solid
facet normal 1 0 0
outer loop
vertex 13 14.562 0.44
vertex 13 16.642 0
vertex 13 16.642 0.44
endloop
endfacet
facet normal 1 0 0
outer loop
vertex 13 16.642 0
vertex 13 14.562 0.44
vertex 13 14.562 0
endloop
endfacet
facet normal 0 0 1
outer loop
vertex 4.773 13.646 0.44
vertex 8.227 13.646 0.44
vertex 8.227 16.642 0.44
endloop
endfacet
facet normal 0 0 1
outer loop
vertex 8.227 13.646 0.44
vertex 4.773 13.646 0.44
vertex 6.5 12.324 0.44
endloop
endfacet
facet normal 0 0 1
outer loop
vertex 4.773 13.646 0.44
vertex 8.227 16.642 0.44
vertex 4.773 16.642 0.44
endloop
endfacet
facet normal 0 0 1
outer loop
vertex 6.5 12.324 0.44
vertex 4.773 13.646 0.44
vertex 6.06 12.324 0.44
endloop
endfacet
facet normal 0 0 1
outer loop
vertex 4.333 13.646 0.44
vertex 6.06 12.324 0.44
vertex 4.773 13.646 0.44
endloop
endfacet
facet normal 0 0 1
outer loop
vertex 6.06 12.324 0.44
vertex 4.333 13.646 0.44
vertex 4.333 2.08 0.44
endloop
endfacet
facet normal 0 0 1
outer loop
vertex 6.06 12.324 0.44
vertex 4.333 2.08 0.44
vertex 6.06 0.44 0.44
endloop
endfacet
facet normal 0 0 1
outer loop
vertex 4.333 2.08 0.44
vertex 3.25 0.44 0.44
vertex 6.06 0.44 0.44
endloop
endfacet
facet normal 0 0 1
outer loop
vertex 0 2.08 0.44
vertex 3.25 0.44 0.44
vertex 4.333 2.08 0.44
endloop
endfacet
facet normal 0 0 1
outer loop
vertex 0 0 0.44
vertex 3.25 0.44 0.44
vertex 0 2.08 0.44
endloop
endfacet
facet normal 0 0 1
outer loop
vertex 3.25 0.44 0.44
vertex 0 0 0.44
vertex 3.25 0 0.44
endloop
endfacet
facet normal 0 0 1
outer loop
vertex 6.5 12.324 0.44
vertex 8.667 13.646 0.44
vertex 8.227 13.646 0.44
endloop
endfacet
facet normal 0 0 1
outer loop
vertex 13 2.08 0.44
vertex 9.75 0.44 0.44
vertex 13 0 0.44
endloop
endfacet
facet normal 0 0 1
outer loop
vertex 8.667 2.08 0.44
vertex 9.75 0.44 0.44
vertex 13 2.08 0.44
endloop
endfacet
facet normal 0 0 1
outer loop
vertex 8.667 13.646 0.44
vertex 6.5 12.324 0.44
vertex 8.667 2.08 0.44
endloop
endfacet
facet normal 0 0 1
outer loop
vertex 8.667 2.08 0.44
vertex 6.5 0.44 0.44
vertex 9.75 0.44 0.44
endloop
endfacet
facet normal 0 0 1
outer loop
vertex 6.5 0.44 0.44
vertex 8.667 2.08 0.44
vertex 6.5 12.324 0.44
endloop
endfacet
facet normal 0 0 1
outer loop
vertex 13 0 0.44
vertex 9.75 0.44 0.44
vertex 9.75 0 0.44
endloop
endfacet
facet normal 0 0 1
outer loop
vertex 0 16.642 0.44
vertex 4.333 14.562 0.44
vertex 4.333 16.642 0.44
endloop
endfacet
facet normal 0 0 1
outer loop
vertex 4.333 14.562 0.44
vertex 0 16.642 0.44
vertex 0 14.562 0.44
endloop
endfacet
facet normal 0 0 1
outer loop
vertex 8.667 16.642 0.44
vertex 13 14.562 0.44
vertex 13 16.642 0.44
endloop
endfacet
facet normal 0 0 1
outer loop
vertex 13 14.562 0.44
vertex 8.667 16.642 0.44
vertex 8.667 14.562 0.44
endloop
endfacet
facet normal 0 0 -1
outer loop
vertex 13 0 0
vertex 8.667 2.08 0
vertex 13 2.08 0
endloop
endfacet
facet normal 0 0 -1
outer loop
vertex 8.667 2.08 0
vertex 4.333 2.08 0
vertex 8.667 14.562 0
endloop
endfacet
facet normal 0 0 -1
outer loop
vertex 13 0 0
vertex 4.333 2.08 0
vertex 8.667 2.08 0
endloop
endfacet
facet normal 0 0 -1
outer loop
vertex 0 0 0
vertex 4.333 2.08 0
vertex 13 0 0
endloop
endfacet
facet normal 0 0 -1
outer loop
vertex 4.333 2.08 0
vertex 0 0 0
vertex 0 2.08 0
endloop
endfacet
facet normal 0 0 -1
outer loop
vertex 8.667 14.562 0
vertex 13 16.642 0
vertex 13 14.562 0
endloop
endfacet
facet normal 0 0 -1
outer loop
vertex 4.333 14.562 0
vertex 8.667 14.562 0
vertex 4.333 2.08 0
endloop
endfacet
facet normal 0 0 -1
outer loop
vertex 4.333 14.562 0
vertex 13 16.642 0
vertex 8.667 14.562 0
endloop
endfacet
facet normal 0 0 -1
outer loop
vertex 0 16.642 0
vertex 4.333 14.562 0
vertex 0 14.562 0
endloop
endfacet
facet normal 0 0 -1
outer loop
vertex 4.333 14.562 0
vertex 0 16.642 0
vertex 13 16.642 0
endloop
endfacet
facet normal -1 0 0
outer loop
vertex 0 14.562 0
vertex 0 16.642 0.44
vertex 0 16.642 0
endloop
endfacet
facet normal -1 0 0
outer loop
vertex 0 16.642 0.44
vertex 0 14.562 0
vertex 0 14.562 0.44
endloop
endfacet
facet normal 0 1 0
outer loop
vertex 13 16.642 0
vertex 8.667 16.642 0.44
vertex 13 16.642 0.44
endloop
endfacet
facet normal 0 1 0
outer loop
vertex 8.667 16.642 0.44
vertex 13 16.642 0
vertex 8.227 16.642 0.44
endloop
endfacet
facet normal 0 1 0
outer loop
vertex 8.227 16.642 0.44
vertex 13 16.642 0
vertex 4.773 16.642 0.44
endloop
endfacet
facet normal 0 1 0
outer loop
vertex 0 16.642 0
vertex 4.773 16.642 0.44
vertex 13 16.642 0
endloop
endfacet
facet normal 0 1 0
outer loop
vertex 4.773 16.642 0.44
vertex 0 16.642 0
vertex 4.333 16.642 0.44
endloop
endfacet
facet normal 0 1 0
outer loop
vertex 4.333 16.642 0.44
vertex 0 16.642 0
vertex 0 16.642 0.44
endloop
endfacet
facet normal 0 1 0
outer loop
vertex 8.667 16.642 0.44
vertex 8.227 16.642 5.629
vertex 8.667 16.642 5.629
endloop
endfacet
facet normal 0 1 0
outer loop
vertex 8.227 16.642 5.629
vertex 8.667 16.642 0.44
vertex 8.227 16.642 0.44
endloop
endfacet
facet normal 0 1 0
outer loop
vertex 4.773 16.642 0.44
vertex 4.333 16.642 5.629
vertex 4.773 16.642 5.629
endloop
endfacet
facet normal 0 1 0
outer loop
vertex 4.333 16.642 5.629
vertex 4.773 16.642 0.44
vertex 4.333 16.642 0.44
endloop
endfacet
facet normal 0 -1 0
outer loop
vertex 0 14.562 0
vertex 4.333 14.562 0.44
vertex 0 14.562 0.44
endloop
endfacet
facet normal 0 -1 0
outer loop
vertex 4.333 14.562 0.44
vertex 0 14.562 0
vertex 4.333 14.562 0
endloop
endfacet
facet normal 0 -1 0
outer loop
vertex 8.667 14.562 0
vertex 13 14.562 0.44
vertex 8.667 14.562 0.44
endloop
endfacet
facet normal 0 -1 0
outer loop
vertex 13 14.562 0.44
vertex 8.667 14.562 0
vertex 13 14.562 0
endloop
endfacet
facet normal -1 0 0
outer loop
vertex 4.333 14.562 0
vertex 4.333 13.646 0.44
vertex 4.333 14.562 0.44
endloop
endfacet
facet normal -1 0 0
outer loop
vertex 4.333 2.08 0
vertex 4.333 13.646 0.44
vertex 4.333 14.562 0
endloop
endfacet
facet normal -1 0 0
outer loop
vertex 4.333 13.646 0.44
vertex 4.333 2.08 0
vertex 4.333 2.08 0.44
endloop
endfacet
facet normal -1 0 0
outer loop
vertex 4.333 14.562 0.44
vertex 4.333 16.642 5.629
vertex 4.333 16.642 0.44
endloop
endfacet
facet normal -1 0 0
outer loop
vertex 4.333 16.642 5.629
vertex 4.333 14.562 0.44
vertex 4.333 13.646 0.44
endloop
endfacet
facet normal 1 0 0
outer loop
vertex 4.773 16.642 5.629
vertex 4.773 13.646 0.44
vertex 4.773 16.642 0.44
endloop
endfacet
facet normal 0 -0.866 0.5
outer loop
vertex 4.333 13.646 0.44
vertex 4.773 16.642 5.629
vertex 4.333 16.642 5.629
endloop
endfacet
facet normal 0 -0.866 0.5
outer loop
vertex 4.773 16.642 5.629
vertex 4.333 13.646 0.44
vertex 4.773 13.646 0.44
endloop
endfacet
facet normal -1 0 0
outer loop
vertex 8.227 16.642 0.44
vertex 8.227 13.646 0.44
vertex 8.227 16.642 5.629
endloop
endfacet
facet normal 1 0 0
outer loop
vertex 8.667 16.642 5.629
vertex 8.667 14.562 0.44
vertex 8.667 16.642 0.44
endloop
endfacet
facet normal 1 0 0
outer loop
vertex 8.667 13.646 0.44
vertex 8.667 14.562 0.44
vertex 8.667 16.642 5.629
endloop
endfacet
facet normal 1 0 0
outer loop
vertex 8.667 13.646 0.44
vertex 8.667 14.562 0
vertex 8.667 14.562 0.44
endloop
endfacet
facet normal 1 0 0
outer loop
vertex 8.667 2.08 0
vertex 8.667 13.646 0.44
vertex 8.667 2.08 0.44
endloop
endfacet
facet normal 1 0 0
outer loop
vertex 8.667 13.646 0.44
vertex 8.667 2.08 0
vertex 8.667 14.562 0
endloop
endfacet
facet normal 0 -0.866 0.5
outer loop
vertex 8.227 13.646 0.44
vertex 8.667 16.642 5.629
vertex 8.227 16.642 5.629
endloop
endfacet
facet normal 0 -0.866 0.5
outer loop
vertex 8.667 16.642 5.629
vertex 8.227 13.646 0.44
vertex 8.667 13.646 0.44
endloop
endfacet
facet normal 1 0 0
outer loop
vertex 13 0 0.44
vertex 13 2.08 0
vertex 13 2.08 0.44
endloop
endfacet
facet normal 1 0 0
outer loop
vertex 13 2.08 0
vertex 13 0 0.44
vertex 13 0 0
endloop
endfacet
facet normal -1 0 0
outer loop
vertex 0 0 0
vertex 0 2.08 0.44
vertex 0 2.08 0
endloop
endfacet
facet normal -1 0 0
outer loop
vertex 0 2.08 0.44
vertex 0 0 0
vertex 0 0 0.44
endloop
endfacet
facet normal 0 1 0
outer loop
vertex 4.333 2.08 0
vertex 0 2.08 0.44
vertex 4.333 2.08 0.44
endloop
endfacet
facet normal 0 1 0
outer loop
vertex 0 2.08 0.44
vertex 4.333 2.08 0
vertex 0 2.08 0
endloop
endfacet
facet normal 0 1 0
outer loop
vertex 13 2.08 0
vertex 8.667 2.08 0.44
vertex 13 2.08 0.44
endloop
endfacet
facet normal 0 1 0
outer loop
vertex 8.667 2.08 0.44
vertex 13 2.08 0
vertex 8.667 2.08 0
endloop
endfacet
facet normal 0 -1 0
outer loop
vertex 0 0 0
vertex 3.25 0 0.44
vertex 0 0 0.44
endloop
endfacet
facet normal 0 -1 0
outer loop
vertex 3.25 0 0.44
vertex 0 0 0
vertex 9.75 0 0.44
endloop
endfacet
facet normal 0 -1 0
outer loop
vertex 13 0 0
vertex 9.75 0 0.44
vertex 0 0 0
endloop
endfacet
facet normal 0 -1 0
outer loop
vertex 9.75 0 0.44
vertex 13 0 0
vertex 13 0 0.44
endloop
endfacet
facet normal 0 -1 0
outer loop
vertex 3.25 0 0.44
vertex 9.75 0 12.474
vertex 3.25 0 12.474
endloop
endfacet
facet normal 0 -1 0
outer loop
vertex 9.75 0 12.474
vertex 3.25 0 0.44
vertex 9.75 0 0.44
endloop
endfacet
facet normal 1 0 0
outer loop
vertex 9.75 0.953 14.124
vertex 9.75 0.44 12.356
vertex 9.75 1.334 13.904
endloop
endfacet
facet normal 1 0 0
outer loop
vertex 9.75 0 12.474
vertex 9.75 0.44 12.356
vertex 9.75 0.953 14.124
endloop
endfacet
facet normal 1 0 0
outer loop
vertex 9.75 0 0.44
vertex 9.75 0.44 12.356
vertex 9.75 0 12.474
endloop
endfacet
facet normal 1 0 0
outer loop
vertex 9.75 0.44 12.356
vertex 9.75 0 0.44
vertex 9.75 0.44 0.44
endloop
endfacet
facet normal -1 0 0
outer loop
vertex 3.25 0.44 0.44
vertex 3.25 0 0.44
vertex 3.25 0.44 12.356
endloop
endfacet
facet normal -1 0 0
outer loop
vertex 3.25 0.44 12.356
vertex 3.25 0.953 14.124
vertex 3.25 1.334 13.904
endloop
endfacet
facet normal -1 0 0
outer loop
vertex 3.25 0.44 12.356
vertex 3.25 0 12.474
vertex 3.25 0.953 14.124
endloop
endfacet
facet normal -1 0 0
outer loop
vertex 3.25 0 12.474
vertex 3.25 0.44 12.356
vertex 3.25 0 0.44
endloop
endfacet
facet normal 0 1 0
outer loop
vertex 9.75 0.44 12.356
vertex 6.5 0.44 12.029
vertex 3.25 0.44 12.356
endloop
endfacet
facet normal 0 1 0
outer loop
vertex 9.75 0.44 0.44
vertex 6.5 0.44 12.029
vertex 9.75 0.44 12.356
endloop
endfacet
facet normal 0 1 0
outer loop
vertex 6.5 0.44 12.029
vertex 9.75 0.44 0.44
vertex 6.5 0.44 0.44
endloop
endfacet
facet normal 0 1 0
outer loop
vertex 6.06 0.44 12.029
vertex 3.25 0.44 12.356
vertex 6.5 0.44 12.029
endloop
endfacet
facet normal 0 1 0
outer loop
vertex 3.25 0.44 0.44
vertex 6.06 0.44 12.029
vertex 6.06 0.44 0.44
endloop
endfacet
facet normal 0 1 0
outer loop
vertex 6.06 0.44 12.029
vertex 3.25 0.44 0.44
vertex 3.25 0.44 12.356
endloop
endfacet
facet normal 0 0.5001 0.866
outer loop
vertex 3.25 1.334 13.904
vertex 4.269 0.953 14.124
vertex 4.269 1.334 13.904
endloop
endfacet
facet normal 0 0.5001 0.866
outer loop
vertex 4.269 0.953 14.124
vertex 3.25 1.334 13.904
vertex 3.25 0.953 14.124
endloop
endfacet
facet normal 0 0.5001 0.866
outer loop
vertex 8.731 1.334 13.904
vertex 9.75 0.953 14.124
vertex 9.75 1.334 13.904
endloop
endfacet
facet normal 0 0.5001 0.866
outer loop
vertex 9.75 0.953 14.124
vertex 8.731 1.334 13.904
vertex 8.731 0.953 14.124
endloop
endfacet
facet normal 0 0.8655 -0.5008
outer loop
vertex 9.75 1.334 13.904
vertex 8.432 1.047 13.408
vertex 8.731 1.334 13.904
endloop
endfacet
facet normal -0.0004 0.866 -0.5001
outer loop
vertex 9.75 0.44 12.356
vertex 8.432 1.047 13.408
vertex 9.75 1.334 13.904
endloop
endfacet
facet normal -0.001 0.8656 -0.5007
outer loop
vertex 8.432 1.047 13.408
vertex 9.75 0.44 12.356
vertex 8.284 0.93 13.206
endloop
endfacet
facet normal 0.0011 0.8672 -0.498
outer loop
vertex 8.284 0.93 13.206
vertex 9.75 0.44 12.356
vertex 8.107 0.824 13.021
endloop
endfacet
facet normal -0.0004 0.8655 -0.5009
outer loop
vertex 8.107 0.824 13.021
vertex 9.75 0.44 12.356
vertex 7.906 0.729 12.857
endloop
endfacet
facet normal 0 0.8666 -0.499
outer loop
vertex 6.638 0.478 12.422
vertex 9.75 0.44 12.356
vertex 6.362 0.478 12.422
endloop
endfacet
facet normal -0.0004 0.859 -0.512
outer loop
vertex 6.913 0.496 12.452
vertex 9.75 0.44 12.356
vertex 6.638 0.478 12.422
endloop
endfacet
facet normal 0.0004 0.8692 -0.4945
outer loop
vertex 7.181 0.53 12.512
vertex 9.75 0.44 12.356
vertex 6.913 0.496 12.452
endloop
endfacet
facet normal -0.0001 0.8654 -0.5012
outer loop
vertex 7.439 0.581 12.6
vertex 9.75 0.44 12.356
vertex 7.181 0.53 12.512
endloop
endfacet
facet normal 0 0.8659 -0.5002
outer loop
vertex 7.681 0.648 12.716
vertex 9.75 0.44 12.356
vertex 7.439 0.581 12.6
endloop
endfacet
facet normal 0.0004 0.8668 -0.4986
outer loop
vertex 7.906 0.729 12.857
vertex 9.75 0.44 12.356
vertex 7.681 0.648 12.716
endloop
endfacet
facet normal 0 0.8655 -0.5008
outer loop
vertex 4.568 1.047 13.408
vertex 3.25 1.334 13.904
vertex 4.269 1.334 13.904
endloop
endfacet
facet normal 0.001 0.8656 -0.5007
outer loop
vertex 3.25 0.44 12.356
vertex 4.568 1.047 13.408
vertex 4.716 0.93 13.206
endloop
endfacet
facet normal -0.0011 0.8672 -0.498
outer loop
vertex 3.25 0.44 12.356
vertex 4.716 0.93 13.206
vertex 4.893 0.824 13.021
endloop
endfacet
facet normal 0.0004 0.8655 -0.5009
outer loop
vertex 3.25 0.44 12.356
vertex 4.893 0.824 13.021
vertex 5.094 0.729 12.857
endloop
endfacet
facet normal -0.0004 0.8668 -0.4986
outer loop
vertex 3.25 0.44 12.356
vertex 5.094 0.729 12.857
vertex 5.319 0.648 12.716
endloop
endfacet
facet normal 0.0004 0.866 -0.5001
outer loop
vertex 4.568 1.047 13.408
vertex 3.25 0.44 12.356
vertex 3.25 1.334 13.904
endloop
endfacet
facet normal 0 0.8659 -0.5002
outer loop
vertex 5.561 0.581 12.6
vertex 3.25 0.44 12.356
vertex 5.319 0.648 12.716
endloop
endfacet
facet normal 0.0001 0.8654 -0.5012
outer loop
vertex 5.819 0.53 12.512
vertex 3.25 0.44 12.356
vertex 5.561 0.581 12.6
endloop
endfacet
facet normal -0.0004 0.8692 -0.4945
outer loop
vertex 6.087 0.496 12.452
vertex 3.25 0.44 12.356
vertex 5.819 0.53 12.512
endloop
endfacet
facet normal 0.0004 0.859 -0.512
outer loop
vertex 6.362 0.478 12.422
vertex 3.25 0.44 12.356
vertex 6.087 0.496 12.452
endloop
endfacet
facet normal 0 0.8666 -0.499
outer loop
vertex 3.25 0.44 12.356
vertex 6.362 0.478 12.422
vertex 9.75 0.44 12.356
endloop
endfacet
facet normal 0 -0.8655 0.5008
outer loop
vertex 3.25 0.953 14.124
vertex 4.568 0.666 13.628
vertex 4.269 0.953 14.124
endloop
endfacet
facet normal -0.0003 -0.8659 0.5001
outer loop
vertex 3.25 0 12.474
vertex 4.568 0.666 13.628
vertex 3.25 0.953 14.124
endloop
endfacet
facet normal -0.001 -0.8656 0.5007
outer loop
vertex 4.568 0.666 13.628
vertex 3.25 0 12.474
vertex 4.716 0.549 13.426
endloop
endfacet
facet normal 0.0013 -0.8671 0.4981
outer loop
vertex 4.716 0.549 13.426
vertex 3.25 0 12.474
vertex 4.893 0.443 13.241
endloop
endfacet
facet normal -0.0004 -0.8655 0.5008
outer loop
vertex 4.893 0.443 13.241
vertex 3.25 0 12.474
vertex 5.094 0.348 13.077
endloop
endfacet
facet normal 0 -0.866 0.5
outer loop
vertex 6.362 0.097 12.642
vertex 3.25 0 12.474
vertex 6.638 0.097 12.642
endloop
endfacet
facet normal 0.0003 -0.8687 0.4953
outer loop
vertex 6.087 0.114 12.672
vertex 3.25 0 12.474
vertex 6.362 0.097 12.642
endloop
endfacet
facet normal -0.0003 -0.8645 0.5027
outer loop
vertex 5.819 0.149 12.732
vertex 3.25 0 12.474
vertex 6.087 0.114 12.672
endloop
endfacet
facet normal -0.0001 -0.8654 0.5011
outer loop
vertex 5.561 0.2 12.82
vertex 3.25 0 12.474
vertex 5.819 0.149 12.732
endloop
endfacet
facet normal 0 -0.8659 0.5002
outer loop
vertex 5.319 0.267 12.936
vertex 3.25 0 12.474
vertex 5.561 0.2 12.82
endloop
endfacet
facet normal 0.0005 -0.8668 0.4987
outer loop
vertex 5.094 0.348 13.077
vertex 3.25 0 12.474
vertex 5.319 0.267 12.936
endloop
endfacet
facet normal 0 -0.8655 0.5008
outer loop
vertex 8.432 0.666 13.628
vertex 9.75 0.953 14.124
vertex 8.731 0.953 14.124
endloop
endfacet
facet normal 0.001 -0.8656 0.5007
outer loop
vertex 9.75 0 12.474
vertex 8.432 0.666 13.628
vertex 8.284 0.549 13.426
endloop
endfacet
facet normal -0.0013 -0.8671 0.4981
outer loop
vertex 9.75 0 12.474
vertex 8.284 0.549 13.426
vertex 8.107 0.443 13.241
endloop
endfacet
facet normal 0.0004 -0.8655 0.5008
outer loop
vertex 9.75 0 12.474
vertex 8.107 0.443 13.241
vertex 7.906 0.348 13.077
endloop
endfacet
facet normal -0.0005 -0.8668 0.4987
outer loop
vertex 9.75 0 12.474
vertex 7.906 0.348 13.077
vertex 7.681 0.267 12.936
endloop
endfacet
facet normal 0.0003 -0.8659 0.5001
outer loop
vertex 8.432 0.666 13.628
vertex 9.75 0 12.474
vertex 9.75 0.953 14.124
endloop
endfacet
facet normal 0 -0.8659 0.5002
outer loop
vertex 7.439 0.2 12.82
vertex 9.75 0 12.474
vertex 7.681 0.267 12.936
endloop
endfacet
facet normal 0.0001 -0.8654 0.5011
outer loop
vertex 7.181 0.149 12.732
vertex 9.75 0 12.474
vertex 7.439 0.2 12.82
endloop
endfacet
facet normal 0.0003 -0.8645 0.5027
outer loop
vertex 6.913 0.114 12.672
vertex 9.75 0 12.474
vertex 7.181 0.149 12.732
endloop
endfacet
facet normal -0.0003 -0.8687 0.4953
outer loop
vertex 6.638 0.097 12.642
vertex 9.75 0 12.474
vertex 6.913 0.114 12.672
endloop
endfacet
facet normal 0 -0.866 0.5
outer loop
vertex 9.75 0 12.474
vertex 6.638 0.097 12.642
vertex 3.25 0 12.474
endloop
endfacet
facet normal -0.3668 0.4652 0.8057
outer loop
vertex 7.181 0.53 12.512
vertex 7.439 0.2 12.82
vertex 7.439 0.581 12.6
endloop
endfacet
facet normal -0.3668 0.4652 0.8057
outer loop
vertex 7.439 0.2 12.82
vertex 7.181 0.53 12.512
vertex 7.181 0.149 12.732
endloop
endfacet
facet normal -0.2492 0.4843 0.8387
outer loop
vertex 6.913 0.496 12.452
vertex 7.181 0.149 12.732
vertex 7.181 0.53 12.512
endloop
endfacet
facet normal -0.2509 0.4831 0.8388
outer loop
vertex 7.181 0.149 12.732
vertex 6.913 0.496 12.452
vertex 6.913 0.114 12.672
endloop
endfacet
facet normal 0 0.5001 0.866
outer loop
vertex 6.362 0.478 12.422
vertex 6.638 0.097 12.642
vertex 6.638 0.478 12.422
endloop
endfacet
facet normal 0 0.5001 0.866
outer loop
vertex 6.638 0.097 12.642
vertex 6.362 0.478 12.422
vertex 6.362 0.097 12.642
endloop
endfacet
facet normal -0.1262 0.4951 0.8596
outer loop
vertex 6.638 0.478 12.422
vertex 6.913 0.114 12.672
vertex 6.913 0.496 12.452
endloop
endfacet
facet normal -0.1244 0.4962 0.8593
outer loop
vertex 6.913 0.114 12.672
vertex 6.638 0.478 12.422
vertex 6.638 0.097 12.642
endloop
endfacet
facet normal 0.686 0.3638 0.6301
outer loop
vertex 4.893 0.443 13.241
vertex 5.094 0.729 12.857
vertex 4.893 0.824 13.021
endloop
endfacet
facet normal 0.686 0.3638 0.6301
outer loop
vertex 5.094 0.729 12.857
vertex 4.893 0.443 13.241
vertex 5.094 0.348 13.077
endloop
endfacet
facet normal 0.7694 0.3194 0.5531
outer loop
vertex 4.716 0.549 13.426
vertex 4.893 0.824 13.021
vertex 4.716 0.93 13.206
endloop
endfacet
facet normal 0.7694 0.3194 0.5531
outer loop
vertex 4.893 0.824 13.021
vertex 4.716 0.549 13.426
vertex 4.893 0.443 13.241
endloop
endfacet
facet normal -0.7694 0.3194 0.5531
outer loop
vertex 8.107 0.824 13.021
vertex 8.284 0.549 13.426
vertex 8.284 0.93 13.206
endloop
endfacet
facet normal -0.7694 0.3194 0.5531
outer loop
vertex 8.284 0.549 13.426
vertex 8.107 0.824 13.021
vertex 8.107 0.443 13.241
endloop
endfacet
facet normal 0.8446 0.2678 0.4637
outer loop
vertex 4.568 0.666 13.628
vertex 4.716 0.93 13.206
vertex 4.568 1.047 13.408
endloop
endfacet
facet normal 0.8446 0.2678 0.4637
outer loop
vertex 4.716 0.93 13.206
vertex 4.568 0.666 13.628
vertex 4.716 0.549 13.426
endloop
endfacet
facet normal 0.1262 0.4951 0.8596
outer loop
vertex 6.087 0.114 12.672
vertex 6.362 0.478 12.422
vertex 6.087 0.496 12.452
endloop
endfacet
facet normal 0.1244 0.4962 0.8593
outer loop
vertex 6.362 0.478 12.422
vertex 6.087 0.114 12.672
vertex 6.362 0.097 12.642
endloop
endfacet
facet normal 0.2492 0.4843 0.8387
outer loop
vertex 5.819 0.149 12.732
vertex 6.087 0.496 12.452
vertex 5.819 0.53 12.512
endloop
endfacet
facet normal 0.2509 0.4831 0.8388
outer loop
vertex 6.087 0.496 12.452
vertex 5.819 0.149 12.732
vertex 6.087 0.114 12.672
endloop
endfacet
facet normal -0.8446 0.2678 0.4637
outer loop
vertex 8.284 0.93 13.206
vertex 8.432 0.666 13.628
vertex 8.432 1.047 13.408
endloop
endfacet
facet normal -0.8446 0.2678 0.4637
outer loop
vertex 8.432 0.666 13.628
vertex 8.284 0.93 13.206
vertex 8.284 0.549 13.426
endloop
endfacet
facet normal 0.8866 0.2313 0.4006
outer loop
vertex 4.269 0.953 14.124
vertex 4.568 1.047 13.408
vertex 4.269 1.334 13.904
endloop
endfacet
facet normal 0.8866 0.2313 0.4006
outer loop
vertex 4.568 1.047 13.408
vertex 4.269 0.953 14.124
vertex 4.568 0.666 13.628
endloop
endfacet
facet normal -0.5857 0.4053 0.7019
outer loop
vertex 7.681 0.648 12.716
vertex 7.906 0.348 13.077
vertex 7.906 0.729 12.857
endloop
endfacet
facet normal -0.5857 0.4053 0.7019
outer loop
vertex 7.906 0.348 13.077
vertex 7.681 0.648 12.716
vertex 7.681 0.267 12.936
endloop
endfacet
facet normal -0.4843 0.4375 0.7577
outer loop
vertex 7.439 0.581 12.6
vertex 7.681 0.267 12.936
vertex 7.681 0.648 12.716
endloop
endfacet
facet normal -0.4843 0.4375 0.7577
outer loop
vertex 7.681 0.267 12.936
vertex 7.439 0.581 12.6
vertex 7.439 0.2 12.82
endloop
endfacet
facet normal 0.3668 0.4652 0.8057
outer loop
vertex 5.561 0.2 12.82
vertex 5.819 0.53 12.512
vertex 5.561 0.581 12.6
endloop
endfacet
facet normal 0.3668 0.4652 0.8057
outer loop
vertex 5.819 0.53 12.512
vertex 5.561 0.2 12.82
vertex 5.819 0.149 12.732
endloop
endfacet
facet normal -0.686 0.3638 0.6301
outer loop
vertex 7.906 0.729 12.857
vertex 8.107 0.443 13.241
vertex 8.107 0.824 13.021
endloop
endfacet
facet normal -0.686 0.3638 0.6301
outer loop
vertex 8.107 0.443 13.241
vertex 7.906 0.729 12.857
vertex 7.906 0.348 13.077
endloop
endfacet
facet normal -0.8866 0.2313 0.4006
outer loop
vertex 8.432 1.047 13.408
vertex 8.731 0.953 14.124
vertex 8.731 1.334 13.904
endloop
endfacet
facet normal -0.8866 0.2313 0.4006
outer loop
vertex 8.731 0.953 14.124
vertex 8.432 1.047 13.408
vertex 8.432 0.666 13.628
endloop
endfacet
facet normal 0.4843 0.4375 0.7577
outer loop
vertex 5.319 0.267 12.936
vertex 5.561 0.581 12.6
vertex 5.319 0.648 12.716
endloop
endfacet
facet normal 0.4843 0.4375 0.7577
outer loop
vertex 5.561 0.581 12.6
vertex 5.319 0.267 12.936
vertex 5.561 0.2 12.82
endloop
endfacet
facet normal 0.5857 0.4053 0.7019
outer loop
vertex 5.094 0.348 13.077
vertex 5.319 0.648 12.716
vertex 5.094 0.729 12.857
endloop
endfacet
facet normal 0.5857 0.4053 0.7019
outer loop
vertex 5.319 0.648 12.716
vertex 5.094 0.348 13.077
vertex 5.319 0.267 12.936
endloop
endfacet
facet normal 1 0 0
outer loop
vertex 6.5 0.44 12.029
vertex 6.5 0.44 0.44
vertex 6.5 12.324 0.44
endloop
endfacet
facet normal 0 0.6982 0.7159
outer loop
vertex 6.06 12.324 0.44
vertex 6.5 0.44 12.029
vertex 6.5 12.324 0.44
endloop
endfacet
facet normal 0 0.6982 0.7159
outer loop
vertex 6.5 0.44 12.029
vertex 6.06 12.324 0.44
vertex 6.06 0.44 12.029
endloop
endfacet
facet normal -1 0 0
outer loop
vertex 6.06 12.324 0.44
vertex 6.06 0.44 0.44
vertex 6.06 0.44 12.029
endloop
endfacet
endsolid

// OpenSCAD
$fn = 50;

union() {
    translate([4.3333, 0, 0]) {
        cube([4.3333, 16.6423, 0.44]);
    };
    union() {
        translate([0, 14.562, 0]) {
            cube([13, 2.0803, 0.44]);
        };
        translate([4.3333, 16.6423, 0]) {
            rotate([180, 270, 0]) {
                linear_extrude(height=0.44) {
                    polygon([[0, 0], [5.6291651245989, 0], [0, 3.25]]);
                };
            };
        };
        translate([8.2266, 16.6423, 0]) {
            rotate([180, 270, 0]) {
                linear_extrude(height=0.44) {
                    polygon([[0, 0], [5.6291651245989, 0], [0, 3.25]]);
                };
            };
        };
    };
    difference() {
        union() {
            cube([13, 2.0803, 0.44]);
            translate([3.25, 0, 0]) {
                cube([6.5, 0.44, 12.4739]);
            };
            translate([3.25, 0, 12.4739]) {
                rotate([-30, 0, 0]) {
                    cube([6.5, 0.44, 1.9053]);
                };
            };
        };
        hull() {
            translate([6.5, 3.4296125922873, 13.2592]) {
                rotate([60, 0, 0]) {
                    cylinder(h=9, r2=2.205, r1=2.205);
                };
            };
            translate([6.5, 3.4296125922873, 15.4592]) {
                rotate([60, 0, 0]) {
                    cylinder(h=9, r2=3.087, r1=3.087);
                };
            };
        };
    };
    translate([6.5, 0.44, 0.44]) {
        rotate([0, 270, 0]) {
            linear_extrude(height=0.44) {
                polygon([[0, 0], [11.5889, 0], [0, 11.883528597973]]);
            };
        };
    };
};
